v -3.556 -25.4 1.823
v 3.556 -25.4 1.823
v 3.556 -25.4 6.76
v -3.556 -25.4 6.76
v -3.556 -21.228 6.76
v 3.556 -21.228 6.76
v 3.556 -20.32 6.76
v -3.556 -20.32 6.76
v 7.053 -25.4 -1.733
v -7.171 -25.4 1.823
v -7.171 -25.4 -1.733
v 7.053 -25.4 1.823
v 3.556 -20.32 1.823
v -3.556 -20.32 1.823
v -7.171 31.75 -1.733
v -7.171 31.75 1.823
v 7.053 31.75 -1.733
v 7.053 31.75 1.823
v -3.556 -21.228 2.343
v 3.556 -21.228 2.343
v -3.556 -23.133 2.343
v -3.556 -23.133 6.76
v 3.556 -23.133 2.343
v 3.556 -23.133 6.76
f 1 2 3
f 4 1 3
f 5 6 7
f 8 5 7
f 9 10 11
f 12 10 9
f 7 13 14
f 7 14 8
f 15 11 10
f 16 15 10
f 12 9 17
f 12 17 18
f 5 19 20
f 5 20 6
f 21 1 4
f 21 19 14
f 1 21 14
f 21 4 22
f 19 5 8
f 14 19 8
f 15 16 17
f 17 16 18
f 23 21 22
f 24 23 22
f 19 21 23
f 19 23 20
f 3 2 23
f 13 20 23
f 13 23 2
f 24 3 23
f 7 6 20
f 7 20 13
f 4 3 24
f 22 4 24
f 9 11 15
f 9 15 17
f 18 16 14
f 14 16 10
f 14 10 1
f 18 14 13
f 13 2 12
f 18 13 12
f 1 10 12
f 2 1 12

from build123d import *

# Parameters (mm, degrees)
F0_W          = 14.224
F0_H          = 3.556
F1_DEPTH      = 25.4
F1_DEPTH_BACK = 31.75
F2_W          = 5.08
F2_H          = 5.08
F3_DEPTH      = 3.556
F3_DEPTH_BACK = 3.556
F4_W          = 1.905
F4_H          = 4.572
F5_DEPTH      = 3.81
F5_DEPTH_BACK = 3.81


with BuildPart() as f1:
    # F0 (on Front) → F1 (new body, two sides)
    with BuildSketch(Plane.XZ) as f1_sk:
        with Locations((-0.0590678749, 0.0447268487)):
            Rectangle(F0_W, F0_H)
    extrude(amount=F1_DEPTH)
    extrude(f1_sk.sketch, amount=-F1_DEPTH_BACK)

    # F2 (on Right) → F3 (join, two sides)
    with BuildSketch(Plane.YZ) as f3_sk:
        with Locations((-22.8598152912, 4.2202161699)):
            Rectangle(F2_W, F2_H)
    extrude(amount=F3_DEPTH)
    extrude(f3_sk.sketch, amount=-F3_DEPTH_BACK)

    # F4 (on Right) → F5 (cut, two sides)
    with BuildSketch(Plane.YZ) as f5_sk:
        with Locations((-22.1804035014, 4.6287587003)):
            Rectangle(F4_W, F4_H)
    extrude(amount=-F5_DEPTH, mode=Mode.SUBTRACT)
    extrude(f5_sk.sketch, amount=F5_DEPTH_BACK, mode=Mode.SUBTRACT)


solid = f1.part
